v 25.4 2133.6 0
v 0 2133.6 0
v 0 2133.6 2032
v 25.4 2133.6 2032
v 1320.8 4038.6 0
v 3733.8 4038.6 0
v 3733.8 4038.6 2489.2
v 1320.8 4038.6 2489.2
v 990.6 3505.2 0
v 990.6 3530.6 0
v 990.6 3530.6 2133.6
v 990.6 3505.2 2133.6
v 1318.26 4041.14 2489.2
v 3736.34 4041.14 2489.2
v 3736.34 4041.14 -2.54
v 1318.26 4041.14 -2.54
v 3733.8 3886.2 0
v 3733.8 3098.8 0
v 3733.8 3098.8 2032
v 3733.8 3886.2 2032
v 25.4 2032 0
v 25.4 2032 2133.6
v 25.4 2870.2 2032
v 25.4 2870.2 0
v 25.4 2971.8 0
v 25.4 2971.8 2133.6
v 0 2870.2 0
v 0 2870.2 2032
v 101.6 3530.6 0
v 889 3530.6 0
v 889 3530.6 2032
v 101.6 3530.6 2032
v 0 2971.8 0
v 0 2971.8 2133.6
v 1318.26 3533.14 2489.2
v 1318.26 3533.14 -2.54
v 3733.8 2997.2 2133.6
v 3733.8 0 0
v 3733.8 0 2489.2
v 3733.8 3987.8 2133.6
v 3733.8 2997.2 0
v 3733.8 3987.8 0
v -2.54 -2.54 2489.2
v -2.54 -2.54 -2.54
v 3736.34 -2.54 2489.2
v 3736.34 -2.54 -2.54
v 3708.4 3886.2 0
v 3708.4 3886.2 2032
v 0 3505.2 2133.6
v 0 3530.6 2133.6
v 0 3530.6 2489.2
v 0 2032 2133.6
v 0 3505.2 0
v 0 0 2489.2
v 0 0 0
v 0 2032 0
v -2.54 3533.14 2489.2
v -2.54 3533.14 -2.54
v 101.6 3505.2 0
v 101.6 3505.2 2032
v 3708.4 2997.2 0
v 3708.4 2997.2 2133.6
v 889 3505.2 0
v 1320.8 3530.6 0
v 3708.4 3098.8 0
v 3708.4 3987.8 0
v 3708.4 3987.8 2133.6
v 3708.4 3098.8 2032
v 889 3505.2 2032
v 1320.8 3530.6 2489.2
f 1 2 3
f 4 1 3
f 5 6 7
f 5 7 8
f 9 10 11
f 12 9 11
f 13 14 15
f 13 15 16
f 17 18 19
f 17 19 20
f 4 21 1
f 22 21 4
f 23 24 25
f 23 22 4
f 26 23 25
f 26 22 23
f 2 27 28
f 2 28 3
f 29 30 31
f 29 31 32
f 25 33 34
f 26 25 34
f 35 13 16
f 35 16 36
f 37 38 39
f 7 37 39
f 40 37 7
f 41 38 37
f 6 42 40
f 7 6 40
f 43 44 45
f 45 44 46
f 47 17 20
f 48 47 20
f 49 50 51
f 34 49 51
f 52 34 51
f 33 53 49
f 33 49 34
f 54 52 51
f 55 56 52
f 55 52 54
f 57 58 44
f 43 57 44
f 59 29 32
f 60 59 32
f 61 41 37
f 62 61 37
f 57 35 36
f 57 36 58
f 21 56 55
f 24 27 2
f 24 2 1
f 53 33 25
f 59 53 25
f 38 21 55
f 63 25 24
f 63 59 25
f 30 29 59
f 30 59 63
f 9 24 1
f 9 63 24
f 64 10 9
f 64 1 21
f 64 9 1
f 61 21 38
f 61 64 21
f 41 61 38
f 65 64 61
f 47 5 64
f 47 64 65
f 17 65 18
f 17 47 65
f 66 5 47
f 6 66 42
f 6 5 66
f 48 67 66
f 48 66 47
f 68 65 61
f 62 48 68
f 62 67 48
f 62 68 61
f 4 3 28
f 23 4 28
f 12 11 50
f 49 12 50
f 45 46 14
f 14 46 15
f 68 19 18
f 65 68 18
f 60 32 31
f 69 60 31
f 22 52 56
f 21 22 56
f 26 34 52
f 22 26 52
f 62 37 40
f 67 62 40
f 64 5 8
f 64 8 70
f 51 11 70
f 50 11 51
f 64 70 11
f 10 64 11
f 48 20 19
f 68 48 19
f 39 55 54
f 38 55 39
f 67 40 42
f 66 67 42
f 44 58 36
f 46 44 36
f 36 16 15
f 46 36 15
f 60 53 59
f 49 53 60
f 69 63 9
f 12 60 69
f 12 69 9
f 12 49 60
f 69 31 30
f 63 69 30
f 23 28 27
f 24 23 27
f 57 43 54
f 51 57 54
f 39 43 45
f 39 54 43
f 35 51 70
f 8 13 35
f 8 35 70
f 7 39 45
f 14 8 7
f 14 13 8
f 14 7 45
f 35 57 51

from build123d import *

# Parameters (mm, degrees)
F1_DEPTH = 2489.2
F2_T     = 2.54
F4_DEPTH = 25.4
F6_DEPTH = 25.4
F8_DEPTH = 25.4


with BuildPart() as f1:
    # F0 (on Top) → F1 (new body)
    with BuildSketch(Plane.XY):
        Polygon((0, 3530.6), (0, 0), (3733.8, 0), (3733.8, 4038.6), (1320.8, 4038.6), (1320.8, 3530.6), align=None)
    extrude(amount=F1_DEPTH)

    # F2
    f2_openings = [f1.faces().sort_by_distance(p)[0] for p in [
        (1923.084122, 1937.093758, 2489.2),
    ]]
    offset(amount=F2_T, openings=f2_openings, kind=Kind.INTERSECTION)

    # F3 (on face) → F4 (join)
    with BuildSketch(Plane(origin=(3733.8, 0, 0), x_dir=(0, -1, 0), z_dir=(-1, 0, 0))):
        Polygon((-3987.8, 2133.6), (-3987.8, 0), (-3886.2, 0), (-3886.2, 2032), (-3098.8, 2032), (-3098.8, 0), (-2997.2, 0), (-2997.2, 2133.6), align=None)
    extrude(amount=F4_DEPTH)

    # F5 (on face) → F6 (join)
    with BuildSketch(Plane.XZ.offset(-3530.6)):
        Polygon((0, 2133.6), (0, 0), (101.6, 0), (101.6, 2032), (889, 2032), (889, 0), (990.6, 0), (990.6, 2133.6), align=None)
    extrude(amount=F6_DEPTH)

    # F7 (on face) → F8 (join)
    with BuildSketch(Plane.YZ):
        Polygon((2032, 2133.6), (2032, 0), (2133.6, 0), (2133.6, 2032), (2870.2, 2032), (2870.2, 0), (2971.8, 0), (2971.8, 2133.6), align=None)
    extrude(amount=F8_DEPTH)


solid = f1.part
